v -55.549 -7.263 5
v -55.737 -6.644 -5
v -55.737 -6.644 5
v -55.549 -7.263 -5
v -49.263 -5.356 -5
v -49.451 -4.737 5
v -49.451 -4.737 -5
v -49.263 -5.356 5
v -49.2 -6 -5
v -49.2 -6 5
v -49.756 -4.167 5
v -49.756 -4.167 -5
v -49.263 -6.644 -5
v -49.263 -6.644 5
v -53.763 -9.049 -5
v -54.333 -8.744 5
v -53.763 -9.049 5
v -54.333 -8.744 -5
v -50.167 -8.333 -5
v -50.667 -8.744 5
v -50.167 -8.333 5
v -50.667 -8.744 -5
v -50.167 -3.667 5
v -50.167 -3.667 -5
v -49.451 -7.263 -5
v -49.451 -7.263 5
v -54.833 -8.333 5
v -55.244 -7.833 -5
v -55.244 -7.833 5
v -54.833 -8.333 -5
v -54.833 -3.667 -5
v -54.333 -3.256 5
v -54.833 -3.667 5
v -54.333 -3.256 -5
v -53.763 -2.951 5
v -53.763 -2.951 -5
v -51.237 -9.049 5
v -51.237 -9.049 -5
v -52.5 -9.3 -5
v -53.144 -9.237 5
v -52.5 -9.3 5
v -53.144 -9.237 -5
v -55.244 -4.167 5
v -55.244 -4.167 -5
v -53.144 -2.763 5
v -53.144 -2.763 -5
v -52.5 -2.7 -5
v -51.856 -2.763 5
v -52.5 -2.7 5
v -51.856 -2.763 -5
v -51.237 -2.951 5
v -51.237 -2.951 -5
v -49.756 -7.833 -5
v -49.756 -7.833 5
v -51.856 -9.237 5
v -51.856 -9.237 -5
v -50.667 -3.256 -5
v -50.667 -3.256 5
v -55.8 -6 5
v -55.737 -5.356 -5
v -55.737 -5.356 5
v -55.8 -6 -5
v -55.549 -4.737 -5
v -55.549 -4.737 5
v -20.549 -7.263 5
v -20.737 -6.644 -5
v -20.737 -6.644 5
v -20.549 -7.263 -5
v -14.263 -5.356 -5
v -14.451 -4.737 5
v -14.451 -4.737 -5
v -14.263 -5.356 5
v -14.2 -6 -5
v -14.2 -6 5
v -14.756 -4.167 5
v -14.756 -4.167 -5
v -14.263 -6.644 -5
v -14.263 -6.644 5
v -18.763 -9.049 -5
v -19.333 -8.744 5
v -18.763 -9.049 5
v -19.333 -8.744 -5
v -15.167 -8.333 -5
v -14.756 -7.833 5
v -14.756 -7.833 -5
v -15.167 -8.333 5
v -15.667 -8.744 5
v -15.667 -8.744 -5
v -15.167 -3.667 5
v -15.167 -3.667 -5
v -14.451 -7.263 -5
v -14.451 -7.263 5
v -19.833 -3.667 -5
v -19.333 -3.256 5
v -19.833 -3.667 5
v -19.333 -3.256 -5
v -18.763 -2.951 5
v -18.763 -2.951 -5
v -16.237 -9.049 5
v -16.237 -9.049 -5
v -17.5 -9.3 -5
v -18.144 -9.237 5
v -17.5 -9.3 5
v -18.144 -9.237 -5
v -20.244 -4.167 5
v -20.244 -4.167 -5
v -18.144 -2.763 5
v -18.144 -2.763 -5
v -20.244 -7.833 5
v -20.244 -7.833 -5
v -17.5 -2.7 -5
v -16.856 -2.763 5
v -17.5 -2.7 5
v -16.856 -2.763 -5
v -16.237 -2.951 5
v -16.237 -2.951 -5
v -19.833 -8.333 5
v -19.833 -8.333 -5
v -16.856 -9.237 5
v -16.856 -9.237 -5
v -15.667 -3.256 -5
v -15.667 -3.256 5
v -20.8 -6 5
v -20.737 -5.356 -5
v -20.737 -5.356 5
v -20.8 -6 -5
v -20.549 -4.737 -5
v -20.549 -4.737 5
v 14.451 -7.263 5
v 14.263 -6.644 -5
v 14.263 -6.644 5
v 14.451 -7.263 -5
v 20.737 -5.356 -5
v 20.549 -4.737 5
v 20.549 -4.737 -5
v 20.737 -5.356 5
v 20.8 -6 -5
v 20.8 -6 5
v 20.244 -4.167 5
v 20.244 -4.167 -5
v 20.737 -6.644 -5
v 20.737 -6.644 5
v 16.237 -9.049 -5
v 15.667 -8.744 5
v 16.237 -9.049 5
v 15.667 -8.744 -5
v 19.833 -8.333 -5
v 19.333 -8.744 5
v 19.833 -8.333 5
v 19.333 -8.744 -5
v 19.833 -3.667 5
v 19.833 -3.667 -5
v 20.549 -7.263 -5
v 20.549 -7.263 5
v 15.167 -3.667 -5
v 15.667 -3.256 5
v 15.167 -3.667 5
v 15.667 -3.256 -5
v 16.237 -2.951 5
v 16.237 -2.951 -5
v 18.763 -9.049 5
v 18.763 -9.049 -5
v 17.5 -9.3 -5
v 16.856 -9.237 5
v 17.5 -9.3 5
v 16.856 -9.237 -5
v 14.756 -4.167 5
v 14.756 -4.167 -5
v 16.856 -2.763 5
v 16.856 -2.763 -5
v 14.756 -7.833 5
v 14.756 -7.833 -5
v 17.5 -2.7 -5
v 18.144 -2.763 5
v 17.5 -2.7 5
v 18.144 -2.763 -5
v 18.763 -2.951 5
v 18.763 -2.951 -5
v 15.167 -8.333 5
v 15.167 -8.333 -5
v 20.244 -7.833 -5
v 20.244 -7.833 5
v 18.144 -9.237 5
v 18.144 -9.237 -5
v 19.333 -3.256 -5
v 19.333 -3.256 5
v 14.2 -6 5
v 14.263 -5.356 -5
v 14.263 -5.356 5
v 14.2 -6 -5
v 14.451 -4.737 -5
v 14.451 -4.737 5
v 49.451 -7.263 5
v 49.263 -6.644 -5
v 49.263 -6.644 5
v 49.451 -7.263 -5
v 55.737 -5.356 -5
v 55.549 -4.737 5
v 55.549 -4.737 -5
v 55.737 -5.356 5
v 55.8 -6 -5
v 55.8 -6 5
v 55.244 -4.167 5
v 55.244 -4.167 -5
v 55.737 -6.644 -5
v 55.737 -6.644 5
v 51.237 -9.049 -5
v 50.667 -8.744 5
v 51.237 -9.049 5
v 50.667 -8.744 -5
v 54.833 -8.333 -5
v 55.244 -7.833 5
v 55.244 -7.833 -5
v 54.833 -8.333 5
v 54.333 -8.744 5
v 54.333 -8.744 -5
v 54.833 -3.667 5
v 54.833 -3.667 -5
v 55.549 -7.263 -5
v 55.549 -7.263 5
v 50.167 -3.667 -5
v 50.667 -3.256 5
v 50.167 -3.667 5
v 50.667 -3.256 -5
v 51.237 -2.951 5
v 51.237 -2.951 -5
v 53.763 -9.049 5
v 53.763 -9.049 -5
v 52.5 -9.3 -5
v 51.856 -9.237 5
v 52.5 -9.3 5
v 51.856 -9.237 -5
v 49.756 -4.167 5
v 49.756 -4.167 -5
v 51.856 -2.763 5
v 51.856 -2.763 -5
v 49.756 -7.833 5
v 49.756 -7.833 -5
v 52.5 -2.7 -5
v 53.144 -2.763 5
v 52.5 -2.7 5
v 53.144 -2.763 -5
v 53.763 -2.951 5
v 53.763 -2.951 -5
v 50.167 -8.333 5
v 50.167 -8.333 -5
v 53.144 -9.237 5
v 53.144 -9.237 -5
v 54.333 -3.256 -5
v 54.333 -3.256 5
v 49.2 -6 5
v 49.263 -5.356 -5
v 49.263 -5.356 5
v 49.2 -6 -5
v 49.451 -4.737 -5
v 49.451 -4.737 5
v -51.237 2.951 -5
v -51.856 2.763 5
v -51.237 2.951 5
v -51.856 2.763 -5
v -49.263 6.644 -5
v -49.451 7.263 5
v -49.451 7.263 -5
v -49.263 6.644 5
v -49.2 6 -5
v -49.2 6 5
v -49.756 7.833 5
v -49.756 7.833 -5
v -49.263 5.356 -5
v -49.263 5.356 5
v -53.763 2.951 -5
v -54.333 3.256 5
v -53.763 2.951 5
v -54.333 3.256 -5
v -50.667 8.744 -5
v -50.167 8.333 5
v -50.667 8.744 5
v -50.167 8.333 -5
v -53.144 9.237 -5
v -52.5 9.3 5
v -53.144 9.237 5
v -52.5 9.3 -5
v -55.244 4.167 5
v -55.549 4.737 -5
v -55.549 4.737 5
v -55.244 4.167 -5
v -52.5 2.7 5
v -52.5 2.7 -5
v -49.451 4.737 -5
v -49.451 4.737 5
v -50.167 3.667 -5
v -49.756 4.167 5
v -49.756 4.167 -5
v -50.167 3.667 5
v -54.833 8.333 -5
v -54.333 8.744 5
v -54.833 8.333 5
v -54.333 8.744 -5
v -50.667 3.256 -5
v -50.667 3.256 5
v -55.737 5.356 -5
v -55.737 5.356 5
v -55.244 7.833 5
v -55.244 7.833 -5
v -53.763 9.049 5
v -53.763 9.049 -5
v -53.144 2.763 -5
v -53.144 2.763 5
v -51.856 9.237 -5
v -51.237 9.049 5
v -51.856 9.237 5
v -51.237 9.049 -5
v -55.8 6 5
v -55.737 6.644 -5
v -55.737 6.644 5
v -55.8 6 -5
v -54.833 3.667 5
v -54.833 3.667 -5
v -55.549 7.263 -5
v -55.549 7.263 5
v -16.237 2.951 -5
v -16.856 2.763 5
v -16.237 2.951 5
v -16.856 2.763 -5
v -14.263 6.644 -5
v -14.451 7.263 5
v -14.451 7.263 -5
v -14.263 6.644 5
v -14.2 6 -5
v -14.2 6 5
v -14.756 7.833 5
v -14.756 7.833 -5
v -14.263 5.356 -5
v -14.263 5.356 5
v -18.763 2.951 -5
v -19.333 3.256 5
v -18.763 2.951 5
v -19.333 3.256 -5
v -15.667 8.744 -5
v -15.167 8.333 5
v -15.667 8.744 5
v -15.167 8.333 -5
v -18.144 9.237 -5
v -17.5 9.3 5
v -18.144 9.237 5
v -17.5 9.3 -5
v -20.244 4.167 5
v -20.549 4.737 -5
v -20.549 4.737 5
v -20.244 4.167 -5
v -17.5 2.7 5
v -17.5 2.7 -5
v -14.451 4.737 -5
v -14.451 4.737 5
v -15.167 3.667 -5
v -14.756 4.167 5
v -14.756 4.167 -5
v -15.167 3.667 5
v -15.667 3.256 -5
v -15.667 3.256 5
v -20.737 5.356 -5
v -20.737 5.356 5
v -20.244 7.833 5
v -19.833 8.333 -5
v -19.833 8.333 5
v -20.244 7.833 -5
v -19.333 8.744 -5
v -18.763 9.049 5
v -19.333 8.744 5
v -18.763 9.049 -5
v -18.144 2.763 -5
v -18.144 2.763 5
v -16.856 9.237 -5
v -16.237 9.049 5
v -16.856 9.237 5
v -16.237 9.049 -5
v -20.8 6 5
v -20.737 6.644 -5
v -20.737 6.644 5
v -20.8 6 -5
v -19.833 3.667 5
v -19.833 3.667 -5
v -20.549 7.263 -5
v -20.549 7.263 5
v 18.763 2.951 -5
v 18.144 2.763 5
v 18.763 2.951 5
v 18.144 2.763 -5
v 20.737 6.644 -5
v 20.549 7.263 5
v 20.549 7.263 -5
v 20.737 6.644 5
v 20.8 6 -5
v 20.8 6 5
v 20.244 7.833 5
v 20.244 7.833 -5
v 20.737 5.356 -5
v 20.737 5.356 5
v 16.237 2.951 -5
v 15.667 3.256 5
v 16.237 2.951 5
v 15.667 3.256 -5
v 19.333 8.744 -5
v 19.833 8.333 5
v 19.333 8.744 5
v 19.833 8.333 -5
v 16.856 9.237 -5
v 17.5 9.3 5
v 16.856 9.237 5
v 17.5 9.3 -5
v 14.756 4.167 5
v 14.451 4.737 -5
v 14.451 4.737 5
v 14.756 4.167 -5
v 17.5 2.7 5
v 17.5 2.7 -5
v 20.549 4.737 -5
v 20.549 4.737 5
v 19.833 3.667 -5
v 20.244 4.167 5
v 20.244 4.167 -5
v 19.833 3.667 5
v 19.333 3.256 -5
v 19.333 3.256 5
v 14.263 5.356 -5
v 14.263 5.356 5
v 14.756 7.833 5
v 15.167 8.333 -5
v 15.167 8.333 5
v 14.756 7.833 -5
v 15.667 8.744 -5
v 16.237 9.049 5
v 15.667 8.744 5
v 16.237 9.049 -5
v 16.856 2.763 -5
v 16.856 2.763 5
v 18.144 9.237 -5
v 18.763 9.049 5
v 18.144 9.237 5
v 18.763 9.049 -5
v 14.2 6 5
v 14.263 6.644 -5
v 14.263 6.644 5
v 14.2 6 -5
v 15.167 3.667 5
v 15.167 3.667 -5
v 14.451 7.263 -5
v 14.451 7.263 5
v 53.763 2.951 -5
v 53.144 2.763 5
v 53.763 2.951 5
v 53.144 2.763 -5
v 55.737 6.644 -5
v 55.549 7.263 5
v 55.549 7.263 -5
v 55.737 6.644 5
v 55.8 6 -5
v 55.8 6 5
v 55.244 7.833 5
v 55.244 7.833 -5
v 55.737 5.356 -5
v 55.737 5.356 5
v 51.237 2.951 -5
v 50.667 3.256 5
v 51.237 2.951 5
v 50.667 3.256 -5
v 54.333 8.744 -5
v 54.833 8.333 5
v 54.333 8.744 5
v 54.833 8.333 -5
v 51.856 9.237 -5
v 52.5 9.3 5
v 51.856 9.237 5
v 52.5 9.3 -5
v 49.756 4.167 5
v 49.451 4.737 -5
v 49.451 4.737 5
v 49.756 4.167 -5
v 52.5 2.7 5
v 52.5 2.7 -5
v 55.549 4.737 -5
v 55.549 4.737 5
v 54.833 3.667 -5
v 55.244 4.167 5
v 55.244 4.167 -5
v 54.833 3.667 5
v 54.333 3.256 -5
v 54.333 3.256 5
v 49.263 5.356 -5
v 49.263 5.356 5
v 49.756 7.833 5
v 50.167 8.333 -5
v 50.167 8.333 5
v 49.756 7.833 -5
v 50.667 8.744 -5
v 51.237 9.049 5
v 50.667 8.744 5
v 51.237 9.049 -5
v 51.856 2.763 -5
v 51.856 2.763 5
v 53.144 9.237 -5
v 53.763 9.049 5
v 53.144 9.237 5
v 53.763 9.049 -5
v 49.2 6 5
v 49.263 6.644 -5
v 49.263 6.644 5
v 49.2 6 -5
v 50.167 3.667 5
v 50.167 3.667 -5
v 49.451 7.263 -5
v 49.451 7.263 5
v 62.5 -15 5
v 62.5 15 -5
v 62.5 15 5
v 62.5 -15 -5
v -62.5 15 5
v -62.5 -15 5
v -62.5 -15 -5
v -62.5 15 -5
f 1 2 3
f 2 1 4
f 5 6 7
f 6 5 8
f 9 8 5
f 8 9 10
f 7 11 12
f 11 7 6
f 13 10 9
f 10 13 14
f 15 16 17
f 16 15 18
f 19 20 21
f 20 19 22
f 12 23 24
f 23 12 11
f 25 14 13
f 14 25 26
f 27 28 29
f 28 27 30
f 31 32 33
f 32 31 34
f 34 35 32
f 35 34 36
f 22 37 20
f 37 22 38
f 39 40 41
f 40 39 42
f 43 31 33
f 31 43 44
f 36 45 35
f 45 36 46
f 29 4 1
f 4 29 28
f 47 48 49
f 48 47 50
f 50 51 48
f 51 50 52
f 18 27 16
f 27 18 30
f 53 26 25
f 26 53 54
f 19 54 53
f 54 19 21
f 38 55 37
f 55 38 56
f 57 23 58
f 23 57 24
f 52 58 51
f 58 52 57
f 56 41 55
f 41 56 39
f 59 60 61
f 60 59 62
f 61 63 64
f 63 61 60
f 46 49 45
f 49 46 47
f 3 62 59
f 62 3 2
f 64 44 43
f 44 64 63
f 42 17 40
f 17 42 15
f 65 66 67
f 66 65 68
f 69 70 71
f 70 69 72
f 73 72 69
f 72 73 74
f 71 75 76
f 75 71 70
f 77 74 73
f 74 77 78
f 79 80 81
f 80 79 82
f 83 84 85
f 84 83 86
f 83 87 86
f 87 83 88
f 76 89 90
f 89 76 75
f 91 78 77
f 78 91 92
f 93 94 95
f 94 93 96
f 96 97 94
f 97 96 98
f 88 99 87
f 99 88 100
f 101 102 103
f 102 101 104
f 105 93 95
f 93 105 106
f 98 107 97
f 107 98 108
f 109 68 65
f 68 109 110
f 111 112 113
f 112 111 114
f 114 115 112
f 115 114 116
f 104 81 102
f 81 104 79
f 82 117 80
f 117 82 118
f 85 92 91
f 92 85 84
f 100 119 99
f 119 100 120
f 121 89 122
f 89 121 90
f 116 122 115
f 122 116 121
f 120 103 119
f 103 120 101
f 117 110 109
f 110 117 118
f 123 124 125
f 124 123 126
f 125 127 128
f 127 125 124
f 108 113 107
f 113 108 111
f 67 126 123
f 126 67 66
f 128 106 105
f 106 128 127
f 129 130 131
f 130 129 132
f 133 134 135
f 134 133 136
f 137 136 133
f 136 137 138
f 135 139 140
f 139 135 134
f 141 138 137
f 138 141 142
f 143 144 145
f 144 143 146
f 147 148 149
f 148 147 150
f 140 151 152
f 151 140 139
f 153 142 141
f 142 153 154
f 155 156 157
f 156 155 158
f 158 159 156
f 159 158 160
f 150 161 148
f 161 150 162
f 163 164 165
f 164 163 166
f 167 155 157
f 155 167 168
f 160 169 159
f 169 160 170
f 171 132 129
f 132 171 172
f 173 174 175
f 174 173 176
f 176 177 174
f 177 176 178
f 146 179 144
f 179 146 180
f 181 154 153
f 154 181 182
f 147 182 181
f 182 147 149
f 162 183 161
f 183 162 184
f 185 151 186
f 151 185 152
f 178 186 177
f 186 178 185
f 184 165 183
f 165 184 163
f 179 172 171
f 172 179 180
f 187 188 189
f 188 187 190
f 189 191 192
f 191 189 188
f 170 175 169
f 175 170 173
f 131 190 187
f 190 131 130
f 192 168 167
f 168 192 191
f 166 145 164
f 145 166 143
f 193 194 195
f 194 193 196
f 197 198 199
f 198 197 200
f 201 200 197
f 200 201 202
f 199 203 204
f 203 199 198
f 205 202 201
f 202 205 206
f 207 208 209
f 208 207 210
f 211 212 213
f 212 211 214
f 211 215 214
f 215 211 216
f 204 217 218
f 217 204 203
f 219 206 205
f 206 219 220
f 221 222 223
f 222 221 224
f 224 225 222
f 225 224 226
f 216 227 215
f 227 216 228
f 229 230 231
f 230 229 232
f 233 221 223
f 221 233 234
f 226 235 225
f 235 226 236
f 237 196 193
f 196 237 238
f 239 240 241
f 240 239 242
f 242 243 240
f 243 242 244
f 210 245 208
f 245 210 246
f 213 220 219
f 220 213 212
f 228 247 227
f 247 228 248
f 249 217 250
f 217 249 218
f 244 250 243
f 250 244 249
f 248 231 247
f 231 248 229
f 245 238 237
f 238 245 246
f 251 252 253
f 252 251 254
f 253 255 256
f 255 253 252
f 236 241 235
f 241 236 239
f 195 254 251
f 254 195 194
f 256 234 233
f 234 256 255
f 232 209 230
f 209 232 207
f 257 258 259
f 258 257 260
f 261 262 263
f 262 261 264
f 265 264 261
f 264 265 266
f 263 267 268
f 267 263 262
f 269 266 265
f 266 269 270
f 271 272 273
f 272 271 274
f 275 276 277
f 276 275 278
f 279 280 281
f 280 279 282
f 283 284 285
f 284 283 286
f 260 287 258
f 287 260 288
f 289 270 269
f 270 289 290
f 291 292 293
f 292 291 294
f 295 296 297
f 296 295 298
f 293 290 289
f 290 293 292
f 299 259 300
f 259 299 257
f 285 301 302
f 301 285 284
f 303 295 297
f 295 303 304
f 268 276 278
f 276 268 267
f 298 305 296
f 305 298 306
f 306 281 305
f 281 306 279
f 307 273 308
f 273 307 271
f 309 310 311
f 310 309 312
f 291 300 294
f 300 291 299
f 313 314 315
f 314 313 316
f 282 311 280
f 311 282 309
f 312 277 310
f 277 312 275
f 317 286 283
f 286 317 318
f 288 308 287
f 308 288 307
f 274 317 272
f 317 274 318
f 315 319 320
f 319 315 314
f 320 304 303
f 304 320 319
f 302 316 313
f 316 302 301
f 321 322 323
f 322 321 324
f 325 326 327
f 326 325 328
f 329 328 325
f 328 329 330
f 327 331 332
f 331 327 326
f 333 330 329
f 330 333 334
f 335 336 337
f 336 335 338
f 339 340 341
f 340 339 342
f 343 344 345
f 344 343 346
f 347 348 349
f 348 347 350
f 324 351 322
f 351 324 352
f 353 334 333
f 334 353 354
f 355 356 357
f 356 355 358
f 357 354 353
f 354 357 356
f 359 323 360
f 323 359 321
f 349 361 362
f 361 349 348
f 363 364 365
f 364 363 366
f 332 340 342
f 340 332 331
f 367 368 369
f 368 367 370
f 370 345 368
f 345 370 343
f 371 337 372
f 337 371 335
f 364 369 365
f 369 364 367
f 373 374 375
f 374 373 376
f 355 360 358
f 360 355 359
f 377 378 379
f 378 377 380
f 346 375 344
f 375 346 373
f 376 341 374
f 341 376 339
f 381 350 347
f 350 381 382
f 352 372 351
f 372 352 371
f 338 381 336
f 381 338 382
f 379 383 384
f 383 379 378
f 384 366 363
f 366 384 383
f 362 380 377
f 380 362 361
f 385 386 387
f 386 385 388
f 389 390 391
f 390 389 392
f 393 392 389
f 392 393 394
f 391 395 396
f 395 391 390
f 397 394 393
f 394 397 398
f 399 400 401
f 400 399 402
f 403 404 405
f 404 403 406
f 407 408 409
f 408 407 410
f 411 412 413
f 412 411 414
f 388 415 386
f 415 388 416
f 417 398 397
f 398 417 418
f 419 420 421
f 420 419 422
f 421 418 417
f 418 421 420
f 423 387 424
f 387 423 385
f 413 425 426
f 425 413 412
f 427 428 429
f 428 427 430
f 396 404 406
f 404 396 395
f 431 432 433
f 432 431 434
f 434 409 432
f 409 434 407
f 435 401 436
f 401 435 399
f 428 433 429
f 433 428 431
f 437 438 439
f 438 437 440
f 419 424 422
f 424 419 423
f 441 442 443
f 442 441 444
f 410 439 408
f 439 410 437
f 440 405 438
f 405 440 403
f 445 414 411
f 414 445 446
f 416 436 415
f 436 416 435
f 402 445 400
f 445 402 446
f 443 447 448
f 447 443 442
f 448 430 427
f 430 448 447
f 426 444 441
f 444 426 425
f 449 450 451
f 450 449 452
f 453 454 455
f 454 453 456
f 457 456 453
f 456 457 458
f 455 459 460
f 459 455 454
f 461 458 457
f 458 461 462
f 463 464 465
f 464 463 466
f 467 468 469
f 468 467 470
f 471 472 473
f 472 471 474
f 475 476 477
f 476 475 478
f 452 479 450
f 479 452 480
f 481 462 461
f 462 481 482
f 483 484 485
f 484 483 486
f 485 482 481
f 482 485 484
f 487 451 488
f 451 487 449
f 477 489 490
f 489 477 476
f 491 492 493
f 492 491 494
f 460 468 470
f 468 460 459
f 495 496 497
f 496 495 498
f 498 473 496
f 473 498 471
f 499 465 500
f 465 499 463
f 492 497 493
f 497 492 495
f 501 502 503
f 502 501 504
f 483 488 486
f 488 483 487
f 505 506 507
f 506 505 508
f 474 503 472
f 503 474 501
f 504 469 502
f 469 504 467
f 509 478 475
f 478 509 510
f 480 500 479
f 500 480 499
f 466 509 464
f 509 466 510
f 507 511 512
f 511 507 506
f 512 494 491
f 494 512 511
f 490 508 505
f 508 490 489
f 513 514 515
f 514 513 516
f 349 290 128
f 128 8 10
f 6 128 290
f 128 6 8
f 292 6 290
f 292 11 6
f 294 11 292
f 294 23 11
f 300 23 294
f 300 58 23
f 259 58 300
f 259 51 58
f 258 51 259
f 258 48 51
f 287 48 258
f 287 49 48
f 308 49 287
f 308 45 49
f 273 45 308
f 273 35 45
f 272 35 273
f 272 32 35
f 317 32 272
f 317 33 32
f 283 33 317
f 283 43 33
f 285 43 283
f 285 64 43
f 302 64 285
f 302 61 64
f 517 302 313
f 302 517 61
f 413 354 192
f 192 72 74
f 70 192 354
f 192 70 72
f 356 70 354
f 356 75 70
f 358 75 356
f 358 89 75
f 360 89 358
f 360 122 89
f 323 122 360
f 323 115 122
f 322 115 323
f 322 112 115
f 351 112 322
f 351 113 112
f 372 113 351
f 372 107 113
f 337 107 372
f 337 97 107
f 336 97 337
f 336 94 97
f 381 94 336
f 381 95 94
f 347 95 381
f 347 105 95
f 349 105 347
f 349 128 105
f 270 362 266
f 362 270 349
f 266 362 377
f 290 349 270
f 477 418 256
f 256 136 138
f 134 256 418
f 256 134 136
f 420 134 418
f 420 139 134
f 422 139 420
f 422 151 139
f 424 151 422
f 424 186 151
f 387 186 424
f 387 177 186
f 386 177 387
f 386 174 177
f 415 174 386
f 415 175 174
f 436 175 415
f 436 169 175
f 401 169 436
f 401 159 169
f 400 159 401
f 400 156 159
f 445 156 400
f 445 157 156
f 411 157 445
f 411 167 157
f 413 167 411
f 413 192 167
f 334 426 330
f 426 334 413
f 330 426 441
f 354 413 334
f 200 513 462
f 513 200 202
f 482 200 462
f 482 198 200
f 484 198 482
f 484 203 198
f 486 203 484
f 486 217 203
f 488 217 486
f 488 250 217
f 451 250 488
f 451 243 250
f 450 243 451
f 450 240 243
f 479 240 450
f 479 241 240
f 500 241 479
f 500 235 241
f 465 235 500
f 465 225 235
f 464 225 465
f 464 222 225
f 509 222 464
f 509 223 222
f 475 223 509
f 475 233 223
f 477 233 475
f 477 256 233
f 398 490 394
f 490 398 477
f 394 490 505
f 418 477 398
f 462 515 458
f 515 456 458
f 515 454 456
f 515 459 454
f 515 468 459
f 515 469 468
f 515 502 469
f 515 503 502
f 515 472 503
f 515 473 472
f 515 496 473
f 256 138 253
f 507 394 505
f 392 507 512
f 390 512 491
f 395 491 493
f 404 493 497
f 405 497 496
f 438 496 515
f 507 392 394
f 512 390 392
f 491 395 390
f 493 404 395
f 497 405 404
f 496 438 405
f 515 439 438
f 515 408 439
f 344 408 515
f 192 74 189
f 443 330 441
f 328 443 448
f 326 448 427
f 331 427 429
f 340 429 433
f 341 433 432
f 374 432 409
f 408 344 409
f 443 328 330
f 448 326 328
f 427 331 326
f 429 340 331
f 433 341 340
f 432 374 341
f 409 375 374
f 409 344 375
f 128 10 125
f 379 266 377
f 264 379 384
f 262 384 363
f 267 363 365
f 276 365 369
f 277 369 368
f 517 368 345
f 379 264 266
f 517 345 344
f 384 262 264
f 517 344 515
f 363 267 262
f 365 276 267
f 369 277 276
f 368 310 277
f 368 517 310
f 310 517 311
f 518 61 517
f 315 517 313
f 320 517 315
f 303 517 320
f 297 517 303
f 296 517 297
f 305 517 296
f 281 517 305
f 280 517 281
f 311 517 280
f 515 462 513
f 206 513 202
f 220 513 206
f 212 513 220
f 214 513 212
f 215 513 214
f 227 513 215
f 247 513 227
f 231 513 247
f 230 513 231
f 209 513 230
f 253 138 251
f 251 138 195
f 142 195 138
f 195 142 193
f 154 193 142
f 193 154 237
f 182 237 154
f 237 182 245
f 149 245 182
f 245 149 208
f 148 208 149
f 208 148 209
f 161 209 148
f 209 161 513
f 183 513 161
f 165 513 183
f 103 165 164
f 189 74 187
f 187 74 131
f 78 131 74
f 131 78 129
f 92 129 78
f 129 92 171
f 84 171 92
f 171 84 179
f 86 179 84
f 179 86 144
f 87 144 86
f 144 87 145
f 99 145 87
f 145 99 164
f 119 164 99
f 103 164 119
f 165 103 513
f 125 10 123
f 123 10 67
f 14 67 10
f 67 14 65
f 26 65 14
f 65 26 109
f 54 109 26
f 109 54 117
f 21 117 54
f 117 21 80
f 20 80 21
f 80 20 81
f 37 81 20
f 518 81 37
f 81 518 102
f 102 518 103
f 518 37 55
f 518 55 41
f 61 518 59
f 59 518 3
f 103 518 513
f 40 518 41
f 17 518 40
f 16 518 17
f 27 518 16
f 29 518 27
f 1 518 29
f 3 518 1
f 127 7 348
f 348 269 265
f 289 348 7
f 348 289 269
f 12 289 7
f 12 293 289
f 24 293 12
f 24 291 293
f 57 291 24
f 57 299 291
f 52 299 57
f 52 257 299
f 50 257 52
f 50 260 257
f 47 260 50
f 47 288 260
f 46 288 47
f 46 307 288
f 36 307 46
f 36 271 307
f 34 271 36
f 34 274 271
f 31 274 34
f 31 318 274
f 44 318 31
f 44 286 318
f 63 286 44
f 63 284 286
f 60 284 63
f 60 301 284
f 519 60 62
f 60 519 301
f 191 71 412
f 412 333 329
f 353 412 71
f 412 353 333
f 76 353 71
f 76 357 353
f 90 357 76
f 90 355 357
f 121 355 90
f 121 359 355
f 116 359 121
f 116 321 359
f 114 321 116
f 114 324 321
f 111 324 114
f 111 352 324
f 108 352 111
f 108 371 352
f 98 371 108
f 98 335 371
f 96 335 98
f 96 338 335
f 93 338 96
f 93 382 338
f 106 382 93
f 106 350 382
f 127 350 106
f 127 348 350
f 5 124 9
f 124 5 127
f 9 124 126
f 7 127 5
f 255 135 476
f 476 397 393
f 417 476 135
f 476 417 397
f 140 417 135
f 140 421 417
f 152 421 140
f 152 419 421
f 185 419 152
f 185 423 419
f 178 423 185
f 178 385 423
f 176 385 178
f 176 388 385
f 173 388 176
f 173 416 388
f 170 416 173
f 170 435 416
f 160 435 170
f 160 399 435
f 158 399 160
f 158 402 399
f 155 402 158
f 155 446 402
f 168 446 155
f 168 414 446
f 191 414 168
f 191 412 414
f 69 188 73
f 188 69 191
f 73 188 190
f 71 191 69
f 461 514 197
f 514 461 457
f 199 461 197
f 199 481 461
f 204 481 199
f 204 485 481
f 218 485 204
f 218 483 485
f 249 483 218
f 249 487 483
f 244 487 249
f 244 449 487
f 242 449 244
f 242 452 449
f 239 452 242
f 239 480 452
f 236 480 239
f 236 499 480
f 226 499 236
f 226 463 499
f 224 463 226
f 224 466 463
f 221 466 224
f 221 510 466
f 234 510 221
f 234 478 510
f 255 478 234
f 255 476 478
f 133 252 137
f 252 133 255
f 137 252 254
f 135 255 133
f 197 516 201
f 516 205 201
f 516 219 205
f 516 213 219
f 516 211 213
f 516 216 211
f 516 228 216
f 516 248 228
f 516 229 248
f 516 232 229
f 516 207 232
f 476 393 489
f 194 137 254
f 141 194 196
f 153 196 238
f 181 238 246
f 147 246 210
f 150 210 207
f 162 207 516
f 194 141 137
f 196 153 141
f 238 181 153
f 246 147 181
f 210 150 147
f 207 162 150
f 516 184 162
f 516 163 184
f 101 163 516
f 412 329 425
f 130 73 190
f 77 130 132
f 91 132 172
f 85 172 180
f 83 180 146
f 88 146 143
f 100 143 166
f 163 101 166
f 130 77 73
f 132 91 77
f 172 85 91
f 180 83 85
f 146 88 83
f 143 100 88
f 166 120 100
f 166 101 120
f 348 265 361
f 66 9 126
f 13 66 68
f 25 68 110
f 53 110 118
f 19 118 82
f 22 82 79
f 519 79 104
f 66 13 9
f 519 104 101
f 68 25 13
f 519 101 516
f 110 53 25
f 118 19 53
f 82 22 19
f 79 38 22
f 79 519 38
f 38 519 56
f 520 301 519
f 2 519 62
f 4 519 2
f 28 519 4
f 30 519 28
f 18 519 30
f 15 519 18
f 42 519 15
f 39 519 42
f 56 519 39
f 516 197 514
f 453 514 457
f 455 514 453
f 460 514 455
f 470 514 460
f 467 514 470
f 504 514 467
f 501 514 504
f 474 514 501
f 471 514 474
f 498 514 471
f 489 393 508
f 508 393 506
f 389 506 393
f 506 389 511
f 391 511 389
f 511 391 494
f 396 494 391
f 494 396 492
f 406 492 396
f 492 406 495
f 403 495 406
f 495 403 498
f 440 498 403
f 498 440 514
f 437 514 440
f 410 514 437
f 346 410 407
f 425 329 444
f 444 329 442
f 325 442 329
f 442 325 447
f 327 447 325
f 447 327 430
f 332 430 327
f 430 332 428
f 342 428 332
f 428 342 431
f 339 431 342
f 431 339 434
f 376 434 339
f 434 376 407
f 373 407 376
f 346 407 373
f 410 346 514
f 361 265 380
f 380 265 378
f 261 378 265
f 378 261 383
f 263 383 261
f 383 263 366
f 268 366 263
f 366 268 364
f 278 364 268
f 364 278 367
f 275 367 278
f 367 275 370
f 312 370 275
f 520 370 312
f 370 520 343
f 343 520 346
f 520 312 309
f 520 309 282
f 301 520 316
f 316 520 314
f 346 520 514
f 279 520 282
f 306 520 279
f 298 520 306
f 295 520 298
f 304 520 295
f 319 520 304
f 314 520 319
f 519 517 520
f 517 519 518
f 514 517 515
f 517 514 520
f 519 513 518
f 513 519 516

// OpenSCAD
$fn = 32;

// ----------------------------------------------------------------------
// Hole bar, 4 x Ø6.6
// tworows layout, 10 mm edge offset
// ----------------------------------------------------------------------

// --- parameters (mm) ---
bar_w = 30;       // bar width (Y)
bar_t = 10;       // bar thickness (Z)
holes = 4;        // holes per row
hole_d = 6.6;     // hole diameter
edge = 10;        // offset from the bar end to the first hole
pitch = 35;       // pitch between neighbouring holes
row_offset = 12;  // distance between the two rows

// --- derived feature positions (mm) ---
span = (holes - 1) * pitch;   // = 105   distance between the end holes
bar_l = span + 2 * edge;      // = 125   overall bar length
start_x = -bar_l / 2 + edge;  // = -52.5   X of the first hole
feature_centers = [
  [start_x + 0 * pitch, -row_offset / 2],
  [start_x + 1 * pitch, -row_offset / 2],
  [start_x + 2 * pitch, -row_offset / 2],
  [start_x + 3 * pitch, -row_offset / 2]
];   // hole centres of the first row
row2_centers = [
  [start_x + 0 * pitch, row_offset / 2],
  [start_x + 1 * pitch, row_offset / 2],
  [start_x + 2 * pitch, row_offset / 2],
  [start_x + 3 * pitch, row_offset / 2]
];   // hole centres of the second row

// bar with two rows of holes, both read from their own centre arrays
difference() {
  translate([-bar_l / 2, -bar_w / 2, -bar_t / 2]) cube([bar_l, bar_w, bar_t]);
  for (centre = feature_centers)
    translate([centre[0], centre[1], 0])
      cylinder(d = hole_d, h = bar_t + 2, center = true);
  for (centre = row2_centers)
    translate([centre[0], centre[1], 0])
      cylinder(d = hole_d, h = bar_t + 2, center = true);
}
